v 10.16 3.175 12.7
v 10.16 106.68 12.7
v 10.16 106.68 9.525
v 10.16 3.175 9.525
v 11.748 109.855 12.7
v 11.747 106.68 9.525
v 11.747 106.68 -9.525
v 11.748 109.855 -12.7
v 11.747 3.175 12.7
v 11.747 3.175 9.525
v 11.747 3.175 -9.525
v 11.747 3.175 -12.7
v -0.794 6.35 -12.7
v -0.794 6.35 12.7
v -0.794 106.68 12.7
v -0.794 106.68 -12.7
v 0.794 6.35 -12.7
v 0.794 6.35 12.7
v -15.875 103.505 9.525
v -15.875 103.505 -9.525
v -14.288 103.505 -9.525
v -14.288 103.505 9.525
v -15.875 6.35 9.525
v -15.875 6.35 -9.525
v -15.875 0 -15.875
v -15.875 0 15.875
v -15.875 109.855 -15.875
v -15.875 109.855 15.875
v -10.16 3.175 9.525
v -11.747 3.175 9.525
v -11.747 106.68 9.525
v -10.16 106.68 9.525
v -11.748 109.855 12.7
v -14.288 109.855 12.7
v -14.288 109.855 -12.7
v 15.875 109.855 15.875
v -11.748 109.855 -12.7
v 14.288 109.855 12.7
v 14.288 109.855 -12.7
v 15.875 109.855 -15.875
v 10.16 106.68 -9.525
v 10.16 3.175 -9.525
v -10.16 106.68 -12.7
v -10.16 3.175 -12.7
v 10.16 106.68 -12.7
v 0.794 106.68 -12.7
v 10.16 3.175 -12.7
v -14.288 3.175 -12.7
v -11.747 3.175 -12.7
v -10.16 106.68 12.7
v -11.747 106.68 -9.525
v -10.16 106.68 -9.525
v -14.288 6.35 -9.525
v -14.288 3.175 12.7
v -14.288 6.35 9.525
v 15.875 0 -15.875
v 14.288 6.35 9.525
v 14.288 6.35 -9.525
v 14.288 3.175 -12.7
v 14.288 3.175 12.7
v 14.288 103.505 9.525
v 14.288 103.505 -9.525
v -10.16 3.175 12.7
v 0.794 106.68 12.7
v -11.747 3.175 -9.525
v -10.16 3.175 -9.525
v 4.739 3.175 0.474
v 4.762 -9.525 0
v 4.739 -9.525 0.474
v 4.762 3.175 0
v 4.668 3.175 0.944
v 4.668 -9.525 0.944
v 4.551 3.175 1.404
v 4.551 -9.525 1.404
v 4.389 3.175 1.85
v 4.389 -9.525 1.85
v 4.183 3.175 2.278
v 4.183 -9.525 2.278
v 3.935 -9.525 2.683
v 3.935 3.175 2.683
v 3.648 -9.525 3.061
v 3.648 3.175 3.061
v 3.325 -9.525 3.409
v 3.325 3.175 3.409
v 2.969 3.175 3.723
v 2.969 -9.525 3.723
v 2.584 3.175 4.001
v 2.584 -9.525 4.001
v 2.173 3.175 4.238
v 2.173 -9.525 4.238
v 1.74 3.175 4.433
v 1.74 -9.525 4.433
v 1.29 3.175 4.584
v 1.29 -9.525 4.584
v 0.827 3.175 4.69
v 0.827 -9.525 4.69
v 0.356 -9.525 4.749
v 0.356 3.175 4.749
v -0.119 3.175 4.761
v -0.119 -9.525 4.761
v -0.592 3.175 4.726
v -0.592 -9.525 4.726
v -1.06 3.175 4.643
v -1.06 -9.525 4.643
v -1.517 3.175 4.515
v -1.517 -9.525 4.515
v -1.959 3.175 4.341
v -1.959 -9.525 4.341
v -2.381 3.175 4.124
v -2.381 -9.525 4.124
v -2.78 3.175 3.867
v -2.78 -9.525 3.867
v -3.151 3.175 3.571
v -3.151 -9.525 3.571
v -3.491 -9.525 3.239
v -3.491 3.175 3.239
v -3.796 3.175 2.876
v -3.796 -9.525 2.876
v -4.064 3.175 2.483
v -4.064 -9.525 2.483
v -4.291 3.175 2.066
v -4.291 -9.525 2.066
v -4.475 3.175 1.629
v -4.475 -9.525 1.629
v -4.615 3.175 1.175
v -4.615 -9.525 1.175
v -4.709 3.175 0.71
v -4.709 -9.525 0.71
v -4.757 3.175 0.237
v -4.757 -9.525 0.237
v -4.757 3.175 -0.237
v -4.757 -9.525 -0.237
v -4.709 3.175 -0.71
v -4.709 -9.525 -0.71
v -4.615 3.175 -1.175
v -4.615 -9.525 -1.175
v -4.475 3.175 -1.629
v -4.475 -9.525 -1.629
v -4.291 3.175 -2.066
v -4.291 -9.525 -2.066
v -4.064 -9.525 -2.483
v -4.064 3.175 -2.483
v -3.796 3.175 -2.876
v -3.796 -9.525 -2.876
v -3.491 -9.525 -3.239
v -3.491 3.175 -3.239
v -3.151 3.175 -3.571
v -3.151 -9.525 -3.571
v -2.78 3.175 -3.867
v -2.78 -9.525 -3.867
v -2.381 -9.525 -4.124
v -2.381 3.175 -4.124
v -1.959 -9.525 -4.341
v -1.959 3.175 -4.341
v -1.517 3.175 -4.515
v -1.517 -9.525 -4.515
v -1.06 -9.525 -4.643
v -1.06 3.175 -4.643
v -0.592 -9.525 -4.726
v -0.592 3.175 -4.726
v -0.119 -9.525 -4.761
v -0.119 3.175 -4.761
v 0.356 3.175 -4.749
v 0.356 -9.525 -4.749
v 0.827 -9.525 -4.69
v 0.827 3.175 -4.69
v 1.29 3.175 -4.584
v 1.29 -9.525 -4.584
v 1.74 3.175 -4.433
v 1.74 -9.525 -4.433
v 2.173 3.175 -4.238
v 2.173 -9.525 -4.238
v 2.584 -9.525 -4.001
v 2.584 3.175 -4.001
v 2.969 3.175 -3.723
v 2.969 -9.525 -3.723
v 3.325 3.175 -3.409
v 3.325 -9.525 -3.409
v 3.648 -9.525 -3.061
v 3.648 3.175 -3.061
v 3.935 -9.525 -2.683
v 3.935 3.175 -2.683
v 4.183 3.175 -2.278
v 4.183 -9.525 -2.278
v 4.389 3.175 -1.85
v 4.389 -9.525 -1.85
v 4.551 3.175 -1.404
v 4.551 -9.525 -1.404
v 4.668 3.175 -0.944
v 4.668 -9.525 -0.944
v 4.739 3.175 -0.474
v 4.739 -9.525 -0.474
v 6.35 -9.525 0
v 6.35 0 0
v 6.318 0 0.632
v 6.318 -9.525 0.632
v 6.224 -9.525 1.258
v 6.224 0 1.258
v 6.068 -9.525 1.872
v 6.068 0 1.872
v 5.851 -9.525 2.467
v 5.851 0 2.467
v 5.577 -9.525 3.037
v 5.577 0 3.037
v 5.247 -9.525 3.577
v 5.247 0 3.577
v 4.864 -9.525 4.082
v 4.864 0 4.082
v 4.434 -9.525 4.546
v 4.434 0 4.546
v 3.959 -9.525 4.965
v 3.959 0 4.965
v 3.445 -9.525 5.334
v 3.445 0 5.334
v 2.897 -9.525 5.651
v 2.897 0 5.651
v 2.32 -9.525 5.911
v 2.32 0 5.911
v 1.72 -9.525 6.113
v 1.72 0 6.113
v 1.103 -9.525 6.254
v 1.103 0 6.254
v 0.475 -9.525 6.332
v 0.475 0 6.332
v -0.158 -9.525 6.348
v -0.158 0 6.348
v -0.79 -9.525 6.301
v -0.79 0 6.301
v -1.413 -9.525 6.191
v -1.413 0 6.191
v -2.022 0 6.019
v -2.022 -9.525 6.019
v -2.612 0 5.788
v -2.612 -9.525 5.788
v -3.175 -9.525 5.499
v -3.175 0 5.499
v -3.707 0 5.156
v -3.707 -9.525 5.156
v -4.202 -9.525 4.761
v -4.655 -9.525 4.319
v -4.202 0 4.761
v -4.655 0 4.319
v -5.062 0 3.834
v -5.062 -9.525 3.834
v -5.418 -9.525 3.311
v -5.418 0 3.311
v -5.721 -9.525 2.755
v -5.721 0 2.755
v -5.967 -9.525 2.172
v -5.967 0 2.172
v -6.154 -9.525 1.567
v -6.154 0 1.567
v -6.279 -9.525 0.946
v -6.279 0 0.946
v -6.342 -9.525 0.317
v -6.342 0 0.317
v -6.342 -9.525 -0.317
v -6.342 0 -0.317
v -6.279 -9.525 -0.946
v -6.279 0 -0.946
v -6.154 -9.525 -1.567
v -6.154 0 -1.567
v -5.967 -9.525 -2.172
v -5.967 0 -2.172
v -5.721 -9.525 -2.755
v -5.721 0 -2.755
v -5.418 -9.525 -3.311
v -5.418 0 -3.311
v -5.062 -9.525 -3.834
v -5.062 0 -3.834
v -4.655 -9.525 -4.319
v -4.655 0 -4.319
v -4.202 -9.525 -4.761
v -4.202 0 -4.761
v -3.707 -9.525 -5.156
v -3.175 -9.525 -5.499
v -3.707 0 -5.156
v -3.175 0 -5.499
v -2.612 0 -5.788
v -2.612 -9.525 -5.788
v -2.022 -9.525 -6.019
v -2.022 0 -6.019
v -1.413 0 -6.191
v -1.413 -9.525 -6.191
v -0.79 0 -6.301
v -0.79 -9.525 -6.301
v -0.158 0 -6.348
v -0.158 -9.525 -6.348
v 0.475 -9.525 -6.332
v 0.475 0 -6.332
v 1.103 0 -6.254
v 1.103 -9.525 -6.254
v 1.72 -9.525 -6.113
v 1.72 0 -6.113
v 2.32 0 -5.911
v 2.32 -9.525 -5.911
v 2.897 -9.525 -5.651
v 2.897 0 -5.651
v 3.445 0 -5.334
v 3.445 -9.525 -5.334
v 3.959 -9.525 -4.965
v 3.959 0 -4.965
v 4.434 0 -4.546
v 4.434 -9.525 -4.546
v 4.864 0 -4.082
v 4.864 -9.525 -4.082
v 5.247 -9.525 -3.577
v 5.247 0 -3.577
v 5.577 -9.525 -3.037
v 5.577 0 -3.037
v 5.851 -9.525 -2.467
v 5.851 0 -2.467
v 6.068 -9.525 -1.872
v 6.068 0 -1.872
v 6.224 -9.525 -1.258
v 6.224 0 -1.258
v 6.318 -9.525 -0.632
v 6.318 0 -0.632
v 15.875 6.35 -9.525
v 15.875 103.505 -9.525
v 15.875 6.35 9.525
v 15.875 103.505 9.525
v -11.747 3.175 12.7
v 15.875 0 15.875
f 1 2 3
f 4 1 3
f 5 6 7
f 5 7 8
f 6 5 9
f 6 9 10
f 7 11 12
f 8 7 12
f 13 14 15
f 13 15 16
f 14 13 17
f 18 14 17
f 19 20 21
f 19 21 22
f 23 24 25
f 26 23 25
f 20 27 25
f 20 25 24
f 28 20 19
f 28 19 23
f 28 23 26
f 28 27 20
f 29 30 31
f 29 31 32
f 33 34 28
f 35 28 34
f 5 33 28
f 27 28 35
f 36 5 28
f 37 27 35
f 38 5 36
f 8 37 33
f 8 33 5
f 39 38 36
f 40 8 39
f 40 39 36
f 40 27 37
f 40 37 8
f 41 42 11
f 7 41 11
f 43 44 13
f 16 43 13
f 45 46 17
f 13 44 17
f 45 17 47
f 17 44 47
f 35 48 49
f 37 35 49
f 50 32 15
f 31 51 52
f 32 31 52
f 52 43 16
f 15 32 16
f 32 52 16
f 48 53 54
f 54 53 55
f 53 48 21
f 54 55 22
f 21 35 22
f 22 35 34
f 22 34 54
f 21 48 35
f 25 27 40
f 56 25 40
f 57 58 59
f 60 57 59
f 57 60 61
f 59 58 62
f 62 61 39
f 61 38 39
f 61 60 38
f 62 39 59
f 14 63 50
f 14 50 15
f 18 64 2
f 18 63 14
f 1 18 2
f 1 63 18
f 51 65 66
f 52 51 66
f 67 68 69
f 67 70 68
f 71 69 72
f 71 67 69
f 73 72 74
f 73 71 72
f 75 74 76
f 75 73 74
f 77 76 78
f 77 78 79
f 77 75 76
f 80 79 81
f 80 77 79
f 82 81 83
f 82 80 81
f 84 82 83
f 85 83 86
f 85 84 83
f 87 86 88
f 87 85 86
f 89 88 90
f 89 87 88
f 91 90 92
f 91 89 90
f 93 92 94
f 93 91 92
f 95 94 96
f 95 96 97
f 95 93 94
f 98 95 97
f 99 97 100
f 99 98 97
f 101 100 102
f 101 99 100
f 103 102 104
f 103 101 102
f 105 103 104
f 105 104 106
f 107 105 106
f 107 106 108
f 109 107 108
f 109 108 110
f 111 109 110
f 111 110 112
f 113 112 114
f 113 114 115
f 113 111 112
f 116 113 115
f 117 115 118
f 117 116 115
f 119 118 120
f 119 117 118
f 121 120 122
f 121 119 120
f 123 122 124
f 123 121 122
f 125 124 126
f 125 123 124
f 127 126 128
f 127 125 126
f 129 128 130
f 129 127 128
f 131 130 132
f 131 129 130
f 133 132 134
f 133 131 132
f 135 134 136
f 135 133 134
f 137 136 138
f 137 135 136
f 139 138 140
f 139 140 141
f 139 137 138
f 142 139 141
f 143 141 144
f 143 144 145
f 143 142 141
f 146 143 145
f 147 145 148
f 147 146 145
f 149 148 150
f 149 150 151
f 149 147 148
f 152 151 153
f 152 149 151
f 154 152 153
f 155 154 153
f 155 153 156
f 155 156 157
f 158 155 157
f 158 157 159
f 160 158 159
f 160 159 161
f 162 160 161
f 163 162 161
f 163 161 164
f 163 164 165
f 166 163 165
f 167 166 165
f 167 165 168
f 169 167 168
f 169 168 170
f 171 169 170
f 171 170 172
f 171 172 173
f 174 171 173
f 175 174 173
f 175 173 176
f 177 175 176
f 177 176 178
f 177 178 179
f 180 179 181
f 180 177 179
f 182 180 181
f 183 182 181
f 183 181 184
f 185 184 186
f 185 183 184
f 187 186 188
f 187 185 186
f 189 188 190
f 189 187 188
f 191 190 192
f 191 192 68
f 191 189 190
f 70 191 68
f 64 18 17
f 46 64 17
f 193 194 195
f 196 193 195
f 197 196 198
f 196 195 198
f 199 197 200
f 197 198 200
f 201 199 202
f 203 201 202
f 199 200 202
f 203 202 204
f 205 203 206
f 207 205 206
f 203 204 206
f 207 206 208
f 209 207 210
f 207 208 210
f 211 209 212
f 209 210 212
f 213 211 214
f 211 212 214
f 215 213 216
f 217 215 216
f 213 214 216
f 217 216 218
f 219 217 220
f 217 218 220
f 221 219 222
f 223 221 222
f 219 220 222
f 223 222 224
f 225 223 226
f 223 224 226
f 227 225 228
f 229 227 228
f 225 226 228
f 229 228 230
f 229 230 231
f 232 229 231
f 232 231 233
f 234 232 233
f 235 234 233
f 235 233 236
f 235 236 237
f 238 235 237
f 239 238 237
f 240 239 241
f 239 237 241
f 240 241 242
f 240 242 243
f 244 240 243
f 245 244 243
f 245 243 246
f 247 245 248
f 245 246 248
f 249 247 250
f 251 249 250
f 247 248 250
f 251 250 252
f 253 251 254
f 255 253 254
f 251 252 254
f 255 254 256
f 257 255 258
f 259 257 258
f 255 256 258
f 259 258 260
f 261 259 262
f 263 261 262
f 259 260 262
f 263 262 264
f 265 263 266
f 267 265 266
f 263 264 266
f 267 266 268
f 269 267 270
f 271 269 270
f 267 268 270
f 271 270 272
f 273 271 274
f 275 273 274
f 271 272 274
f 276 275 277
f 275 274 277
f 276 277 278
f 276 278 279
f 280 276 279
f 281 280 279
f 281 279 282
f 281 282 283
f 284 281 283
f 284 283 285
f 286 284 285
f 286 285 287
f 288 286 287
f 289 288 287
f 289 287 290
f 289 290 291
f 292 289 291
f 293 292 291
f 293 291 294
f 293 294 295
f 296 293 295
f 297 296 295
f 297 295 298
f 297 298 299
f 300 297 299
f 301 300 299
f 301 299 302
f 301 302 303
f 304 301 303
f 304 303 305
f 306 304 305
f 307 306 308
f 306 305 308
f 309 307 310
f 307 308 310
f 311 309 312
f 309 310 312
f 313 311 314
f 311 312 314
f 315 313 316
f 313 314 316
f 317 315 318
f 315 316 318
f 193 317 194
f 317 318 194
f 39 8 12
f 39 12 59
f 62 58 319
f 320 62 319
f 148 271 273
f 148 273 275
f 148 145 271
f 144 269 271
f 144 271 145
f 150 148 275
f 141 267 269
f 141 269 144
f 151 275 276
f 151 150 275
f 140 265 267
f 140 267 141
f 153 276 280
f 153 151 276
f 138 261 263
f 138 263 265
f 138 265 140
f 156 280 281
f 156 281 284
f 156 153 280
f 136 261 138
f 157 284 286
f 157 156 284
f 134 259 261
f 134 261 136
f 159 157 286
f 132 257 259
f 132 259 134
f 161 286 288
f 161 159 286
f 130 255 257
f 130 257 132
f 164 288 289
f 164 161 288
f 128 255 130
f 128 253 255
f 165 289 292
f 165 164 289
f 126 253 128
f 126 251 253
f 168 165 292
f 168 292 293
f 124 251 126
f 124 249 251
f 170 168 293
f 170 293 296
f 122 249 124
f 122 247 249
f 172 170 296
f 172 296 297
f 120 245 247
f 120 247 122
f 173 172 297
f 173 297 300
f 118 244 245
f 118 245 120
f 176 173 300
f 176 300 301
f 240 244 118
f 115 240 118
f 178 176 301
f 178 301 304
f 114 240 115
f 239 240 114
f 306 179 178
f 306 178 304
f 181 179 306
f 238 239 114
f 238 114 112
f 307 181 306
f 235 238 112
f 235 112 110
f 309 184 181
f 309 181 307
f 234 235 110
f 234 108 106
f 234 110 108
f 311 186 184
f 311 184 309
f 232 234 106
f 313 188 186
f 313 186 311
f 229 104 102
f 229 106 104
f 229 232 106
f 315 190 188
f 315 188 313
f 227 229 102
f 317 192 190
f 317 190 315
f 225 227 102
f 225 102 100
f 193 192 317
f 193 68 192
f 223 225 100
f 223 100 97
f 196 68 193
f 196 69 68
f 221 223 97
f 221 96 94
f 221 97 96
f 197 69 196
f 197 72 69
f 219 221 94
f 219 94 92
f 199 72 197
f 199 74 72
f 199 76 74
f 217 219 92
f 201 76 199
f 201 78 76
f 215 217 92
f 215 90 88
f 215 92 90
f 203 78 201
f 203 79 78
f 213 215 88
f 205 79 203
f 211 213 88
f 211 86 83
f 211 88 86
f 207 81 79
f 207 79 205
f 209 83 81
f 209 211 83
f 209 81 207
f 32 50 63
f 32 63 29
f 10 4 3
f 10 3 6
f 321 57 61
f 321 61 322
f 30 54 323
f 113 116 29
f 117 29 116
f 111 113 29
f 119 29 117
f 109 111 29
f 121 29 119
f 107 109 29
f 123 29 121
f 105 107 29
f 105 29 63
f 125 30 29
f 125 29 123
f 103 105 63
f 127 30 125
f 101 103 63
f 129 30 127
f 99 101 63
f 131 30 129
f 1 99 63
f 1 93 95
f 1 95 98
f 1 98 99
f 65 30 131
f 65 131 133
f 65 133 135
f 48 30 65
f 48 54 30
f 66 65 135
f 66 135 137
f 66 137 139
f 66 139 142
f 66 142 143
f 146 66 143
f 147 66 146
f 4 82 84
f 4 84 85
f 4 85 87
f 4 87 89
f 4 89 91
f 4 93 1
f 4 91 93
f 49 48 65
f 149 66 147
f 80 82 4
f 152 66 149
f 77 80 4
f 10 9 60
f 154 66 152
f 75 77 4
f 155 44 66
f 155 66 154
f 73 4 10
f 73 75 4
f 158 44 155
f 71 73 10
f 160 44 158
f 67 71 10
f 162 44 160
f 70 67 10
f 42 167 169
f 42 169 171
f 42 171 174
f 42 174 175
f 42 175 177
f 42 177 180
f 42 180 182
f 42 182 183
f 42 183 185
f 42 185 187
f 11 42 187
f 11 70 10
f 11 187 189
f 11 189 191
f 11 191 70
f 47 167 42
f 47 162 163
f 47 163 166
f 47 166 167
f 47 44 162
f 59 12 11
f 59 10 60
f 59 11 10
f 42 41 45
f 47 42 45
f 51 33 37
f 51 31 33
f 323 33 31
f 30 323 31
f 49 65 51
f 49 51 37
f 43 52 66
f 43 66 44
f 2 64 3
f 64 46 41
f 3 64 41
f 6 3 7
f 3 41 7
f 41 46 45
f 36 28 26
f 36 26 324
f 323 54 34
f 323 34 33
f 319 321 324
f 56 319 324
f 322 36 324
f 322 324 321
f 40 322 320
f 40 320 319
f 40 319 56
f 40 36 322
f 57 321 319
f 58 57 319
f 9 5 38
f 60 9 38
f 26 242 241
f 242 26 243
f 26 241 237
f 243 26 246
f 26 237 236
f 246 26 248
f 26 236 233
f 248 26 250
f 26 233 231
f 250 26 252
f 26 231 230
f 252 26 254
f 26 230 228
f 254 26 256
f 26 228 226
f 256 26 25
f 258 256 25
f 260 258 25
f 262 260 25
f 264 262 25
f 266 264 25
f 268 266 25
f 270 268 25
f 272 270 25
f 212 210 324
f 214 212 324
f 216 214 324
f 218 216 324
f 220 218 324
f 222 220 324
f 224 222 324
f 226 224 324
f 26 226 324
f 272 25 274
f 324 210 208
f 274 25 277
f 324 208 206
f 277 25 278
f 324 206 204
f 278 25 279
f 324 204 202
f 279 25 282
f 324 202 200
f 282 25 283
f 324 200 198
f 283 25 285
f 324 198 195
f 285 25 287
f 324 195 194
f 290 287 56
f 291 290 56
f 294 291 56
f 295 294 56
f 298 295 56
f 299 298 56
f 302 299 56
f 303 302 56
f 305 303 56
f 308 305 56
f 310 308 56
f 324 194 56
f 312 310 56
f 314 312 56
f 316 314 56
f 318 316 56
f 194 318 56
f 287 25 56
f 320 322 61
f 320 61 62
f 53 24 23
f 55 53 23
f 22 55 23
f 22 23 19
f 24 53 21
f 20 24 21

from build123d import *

# Parameters (mm, degrees)
SKETCH1_W           = 31.75
SKETCH1_H           = 31.75
BOSS_EXTRUDE1_DEPTH = 109.855
SHELL1_T            = -3.175
SKETCH2_R           = 4.7625
CUT_EXTRUDE1_DEPTH  = 3.175
SKETCH4_W           = 1.5875
SKETCH4_H           = 3.175
BOSS_EXTRUDE4_DEPTH = 103.505
SKETCH6_W           = 19.05
SKETCH6_H           = 103.505
CUT_EXTRUDE3_DEPTH  = 114.3
SKETCH5_W           = 2.54
SKETCH5_H           = 25.4
CUT_EXTRUDE2_DEPTH  = 106.68
SKETCH8_W           = 19.05
SKETCH8_H           = 3.175
BOSS_EXTRUDE5_DEPTH = 1.5875
SKETCH10_W          = 19.05
SKETCH10_H          = 3.175
BOSS_EXTRUDE7_DEPTH = 1.5875
SKETCH11_W          = 1.5875
SKETCH11_H          = 31.75
BOSS_EXTRUDE8_DEPTH = 103.505
SKETCH13_R          = 6.35
SKETCH13_R_2        = 4.7625
BOSS_EXTRUDE9_DEPTH = 9.525


with BuildPart() as part:
    # Sketch1 → Boss-Extrude1 (new body)
    with BuildSketch(Plane(origin=(0, 0, 0), x_dir=(1, 0, 0), z_dir=(0, 1, 0))):
        Rectangle(SKETCH1_W, SKETCH1_H)
    extrude(amount=BOSS_EXTRUDE1_DEPTH)

    # Shell1
    shell1_openings = [part.faces().sort_by_distance(p)[0] for p in [
        (15.875, 54.9275, 0),
    ]]
    offset(amount=SHELL1_T, openings=shell1_openings, kind=Kind.INTERSECTION)

    # Sketch2 → Cut-Extrude1 (cut)
    with BuildSketch(Plane.XZ):
        Circle(SKETCH2_R)
    extrude(amount=-CUT_EXTRUDE1_DEPTH, mode=Mode.SUBTRACT)

    # Sketch4 → Boss-Extrude4 (add)
    with BuildSketch(Plane(origin=(0, 3.175, 0), x_dir=(1, 0, 0), z_dir=(0, 1, 0))):
        with Locations((15.08125, -11.1125)):
            Rectangle(SKETCH4_W, SKETCH4_H)
        with Locations((15.08125, 11.1125)):
            Rectangle(SKETCH4_W, SKETCH4_H)
        with Locations((10.95375, -11.1125)):
            Rectangle(SKETCH4_W, SKETCH4_H)
        with Locations((10.95375, 11.1125)):
            Rectangle(SKETCH4_W, SKETCH4_H)
        with Locations((-10.95375, 11.1125)):
            Rectangle(SKETCH4_W, SKETCH4_H)
        with Locations((-15.08125, 11.1125)):
            Rectangle(SKETCH4_W, SKETCH4_H)
        with Locations((-15.08125, -11.1125)):
            Rectangle(SKETCH4_W, SKETCH4_H)
        with Locations((-10.95375, -11.1125)):
            Rectangle(SKETCH4_W, SKETCH4_H)
    extrude(amount=BOSS_EXTRUDE4_DEPTH)

    # Sketch6 → Cut-Extrude3 (cut)
    with BuildSketch(Plane(origin=(-12.7, 0, 0), x_dir=(0, 0, -1), z_dir=(1, 0, 0))):
        with Locations((0, 54.9275)):
            Rectangle(SKETCH6_W, SKETCH6_H)
    extrude(amount=-CUT_EXTRUDE3_DEPTH, mode=Mode.SUBTRACT)

    # Sketch5 → Cut-Extrude2 (cut)
    with BuildSketch(Plane(origin=(0, 3.175, 0), x_dir=(1, 0, 0), z_dir=(0, 1, 0))):
        with Locations((13.0175, 0)):
            Rectangle(SKETCH5_W, SKETCH5_H)
        with Locations((-13.0175, 0)):
            Rectangle(SKETCH5_W, SKETCH5_H)
    extrude(amount=CUT_EXTRUDE2_DEPTH, mode=Mode.SUBTRACT)

    # Sketch8 → Boss-Extrude5 (add)
    with BuildSketch(Plane(origin=(15.875, 0, 0), x_dir=(0, 0, -1), z_dir=(1, 0, 0))):
        with Locations((0, 105.0925)):
            Rectangle(SKETCH8_W, SKETCH8_H)
        with Locations((0, 4.7625)):
            Rectangle(SKETCH8_W, SKETCH8_H)
    extrude(amount=-BOSS_EXTRUDE5_DEPTH)

    # Sketch10 → Boss-Extrude7 (add)
    with BuildSketch(Plane.ZY.offset(15.875)):
        with Locations((0, 4.7625)):
            Rectangle(SKETCH10_W, SKETCH10_H)
        with Locations((0, 105.0925)):
            Rectangle(SKETCH10_W, SKETCH10_H)
    extrude(amount=-BOSS_EXTRUDE7_DEPTH)

    # Sketch11 → Boss-Extrude8 (add)
    with BuildSketch(Plane(origin=(0, 109.855, 0), x_dir=(1, 0, 0), z_dir=(0, 1, 0))):
        Rectangle(SKETCH11_W, SKETCH11_H)
    extrude(amount=-BOSS_EXTRUDE8_DEPTH)

    # Sketch13 → Boss-Extrude9 (add)
    with BuildSketch(Plane.XZ):
        Circle(SKETCH13_R)
        Circle(SKETCH13_R_2, mode=Mode.SUBTRACT)
    extrude(amount=BOSS_EXTRUDE9_DEPTH)


solid = part.part
